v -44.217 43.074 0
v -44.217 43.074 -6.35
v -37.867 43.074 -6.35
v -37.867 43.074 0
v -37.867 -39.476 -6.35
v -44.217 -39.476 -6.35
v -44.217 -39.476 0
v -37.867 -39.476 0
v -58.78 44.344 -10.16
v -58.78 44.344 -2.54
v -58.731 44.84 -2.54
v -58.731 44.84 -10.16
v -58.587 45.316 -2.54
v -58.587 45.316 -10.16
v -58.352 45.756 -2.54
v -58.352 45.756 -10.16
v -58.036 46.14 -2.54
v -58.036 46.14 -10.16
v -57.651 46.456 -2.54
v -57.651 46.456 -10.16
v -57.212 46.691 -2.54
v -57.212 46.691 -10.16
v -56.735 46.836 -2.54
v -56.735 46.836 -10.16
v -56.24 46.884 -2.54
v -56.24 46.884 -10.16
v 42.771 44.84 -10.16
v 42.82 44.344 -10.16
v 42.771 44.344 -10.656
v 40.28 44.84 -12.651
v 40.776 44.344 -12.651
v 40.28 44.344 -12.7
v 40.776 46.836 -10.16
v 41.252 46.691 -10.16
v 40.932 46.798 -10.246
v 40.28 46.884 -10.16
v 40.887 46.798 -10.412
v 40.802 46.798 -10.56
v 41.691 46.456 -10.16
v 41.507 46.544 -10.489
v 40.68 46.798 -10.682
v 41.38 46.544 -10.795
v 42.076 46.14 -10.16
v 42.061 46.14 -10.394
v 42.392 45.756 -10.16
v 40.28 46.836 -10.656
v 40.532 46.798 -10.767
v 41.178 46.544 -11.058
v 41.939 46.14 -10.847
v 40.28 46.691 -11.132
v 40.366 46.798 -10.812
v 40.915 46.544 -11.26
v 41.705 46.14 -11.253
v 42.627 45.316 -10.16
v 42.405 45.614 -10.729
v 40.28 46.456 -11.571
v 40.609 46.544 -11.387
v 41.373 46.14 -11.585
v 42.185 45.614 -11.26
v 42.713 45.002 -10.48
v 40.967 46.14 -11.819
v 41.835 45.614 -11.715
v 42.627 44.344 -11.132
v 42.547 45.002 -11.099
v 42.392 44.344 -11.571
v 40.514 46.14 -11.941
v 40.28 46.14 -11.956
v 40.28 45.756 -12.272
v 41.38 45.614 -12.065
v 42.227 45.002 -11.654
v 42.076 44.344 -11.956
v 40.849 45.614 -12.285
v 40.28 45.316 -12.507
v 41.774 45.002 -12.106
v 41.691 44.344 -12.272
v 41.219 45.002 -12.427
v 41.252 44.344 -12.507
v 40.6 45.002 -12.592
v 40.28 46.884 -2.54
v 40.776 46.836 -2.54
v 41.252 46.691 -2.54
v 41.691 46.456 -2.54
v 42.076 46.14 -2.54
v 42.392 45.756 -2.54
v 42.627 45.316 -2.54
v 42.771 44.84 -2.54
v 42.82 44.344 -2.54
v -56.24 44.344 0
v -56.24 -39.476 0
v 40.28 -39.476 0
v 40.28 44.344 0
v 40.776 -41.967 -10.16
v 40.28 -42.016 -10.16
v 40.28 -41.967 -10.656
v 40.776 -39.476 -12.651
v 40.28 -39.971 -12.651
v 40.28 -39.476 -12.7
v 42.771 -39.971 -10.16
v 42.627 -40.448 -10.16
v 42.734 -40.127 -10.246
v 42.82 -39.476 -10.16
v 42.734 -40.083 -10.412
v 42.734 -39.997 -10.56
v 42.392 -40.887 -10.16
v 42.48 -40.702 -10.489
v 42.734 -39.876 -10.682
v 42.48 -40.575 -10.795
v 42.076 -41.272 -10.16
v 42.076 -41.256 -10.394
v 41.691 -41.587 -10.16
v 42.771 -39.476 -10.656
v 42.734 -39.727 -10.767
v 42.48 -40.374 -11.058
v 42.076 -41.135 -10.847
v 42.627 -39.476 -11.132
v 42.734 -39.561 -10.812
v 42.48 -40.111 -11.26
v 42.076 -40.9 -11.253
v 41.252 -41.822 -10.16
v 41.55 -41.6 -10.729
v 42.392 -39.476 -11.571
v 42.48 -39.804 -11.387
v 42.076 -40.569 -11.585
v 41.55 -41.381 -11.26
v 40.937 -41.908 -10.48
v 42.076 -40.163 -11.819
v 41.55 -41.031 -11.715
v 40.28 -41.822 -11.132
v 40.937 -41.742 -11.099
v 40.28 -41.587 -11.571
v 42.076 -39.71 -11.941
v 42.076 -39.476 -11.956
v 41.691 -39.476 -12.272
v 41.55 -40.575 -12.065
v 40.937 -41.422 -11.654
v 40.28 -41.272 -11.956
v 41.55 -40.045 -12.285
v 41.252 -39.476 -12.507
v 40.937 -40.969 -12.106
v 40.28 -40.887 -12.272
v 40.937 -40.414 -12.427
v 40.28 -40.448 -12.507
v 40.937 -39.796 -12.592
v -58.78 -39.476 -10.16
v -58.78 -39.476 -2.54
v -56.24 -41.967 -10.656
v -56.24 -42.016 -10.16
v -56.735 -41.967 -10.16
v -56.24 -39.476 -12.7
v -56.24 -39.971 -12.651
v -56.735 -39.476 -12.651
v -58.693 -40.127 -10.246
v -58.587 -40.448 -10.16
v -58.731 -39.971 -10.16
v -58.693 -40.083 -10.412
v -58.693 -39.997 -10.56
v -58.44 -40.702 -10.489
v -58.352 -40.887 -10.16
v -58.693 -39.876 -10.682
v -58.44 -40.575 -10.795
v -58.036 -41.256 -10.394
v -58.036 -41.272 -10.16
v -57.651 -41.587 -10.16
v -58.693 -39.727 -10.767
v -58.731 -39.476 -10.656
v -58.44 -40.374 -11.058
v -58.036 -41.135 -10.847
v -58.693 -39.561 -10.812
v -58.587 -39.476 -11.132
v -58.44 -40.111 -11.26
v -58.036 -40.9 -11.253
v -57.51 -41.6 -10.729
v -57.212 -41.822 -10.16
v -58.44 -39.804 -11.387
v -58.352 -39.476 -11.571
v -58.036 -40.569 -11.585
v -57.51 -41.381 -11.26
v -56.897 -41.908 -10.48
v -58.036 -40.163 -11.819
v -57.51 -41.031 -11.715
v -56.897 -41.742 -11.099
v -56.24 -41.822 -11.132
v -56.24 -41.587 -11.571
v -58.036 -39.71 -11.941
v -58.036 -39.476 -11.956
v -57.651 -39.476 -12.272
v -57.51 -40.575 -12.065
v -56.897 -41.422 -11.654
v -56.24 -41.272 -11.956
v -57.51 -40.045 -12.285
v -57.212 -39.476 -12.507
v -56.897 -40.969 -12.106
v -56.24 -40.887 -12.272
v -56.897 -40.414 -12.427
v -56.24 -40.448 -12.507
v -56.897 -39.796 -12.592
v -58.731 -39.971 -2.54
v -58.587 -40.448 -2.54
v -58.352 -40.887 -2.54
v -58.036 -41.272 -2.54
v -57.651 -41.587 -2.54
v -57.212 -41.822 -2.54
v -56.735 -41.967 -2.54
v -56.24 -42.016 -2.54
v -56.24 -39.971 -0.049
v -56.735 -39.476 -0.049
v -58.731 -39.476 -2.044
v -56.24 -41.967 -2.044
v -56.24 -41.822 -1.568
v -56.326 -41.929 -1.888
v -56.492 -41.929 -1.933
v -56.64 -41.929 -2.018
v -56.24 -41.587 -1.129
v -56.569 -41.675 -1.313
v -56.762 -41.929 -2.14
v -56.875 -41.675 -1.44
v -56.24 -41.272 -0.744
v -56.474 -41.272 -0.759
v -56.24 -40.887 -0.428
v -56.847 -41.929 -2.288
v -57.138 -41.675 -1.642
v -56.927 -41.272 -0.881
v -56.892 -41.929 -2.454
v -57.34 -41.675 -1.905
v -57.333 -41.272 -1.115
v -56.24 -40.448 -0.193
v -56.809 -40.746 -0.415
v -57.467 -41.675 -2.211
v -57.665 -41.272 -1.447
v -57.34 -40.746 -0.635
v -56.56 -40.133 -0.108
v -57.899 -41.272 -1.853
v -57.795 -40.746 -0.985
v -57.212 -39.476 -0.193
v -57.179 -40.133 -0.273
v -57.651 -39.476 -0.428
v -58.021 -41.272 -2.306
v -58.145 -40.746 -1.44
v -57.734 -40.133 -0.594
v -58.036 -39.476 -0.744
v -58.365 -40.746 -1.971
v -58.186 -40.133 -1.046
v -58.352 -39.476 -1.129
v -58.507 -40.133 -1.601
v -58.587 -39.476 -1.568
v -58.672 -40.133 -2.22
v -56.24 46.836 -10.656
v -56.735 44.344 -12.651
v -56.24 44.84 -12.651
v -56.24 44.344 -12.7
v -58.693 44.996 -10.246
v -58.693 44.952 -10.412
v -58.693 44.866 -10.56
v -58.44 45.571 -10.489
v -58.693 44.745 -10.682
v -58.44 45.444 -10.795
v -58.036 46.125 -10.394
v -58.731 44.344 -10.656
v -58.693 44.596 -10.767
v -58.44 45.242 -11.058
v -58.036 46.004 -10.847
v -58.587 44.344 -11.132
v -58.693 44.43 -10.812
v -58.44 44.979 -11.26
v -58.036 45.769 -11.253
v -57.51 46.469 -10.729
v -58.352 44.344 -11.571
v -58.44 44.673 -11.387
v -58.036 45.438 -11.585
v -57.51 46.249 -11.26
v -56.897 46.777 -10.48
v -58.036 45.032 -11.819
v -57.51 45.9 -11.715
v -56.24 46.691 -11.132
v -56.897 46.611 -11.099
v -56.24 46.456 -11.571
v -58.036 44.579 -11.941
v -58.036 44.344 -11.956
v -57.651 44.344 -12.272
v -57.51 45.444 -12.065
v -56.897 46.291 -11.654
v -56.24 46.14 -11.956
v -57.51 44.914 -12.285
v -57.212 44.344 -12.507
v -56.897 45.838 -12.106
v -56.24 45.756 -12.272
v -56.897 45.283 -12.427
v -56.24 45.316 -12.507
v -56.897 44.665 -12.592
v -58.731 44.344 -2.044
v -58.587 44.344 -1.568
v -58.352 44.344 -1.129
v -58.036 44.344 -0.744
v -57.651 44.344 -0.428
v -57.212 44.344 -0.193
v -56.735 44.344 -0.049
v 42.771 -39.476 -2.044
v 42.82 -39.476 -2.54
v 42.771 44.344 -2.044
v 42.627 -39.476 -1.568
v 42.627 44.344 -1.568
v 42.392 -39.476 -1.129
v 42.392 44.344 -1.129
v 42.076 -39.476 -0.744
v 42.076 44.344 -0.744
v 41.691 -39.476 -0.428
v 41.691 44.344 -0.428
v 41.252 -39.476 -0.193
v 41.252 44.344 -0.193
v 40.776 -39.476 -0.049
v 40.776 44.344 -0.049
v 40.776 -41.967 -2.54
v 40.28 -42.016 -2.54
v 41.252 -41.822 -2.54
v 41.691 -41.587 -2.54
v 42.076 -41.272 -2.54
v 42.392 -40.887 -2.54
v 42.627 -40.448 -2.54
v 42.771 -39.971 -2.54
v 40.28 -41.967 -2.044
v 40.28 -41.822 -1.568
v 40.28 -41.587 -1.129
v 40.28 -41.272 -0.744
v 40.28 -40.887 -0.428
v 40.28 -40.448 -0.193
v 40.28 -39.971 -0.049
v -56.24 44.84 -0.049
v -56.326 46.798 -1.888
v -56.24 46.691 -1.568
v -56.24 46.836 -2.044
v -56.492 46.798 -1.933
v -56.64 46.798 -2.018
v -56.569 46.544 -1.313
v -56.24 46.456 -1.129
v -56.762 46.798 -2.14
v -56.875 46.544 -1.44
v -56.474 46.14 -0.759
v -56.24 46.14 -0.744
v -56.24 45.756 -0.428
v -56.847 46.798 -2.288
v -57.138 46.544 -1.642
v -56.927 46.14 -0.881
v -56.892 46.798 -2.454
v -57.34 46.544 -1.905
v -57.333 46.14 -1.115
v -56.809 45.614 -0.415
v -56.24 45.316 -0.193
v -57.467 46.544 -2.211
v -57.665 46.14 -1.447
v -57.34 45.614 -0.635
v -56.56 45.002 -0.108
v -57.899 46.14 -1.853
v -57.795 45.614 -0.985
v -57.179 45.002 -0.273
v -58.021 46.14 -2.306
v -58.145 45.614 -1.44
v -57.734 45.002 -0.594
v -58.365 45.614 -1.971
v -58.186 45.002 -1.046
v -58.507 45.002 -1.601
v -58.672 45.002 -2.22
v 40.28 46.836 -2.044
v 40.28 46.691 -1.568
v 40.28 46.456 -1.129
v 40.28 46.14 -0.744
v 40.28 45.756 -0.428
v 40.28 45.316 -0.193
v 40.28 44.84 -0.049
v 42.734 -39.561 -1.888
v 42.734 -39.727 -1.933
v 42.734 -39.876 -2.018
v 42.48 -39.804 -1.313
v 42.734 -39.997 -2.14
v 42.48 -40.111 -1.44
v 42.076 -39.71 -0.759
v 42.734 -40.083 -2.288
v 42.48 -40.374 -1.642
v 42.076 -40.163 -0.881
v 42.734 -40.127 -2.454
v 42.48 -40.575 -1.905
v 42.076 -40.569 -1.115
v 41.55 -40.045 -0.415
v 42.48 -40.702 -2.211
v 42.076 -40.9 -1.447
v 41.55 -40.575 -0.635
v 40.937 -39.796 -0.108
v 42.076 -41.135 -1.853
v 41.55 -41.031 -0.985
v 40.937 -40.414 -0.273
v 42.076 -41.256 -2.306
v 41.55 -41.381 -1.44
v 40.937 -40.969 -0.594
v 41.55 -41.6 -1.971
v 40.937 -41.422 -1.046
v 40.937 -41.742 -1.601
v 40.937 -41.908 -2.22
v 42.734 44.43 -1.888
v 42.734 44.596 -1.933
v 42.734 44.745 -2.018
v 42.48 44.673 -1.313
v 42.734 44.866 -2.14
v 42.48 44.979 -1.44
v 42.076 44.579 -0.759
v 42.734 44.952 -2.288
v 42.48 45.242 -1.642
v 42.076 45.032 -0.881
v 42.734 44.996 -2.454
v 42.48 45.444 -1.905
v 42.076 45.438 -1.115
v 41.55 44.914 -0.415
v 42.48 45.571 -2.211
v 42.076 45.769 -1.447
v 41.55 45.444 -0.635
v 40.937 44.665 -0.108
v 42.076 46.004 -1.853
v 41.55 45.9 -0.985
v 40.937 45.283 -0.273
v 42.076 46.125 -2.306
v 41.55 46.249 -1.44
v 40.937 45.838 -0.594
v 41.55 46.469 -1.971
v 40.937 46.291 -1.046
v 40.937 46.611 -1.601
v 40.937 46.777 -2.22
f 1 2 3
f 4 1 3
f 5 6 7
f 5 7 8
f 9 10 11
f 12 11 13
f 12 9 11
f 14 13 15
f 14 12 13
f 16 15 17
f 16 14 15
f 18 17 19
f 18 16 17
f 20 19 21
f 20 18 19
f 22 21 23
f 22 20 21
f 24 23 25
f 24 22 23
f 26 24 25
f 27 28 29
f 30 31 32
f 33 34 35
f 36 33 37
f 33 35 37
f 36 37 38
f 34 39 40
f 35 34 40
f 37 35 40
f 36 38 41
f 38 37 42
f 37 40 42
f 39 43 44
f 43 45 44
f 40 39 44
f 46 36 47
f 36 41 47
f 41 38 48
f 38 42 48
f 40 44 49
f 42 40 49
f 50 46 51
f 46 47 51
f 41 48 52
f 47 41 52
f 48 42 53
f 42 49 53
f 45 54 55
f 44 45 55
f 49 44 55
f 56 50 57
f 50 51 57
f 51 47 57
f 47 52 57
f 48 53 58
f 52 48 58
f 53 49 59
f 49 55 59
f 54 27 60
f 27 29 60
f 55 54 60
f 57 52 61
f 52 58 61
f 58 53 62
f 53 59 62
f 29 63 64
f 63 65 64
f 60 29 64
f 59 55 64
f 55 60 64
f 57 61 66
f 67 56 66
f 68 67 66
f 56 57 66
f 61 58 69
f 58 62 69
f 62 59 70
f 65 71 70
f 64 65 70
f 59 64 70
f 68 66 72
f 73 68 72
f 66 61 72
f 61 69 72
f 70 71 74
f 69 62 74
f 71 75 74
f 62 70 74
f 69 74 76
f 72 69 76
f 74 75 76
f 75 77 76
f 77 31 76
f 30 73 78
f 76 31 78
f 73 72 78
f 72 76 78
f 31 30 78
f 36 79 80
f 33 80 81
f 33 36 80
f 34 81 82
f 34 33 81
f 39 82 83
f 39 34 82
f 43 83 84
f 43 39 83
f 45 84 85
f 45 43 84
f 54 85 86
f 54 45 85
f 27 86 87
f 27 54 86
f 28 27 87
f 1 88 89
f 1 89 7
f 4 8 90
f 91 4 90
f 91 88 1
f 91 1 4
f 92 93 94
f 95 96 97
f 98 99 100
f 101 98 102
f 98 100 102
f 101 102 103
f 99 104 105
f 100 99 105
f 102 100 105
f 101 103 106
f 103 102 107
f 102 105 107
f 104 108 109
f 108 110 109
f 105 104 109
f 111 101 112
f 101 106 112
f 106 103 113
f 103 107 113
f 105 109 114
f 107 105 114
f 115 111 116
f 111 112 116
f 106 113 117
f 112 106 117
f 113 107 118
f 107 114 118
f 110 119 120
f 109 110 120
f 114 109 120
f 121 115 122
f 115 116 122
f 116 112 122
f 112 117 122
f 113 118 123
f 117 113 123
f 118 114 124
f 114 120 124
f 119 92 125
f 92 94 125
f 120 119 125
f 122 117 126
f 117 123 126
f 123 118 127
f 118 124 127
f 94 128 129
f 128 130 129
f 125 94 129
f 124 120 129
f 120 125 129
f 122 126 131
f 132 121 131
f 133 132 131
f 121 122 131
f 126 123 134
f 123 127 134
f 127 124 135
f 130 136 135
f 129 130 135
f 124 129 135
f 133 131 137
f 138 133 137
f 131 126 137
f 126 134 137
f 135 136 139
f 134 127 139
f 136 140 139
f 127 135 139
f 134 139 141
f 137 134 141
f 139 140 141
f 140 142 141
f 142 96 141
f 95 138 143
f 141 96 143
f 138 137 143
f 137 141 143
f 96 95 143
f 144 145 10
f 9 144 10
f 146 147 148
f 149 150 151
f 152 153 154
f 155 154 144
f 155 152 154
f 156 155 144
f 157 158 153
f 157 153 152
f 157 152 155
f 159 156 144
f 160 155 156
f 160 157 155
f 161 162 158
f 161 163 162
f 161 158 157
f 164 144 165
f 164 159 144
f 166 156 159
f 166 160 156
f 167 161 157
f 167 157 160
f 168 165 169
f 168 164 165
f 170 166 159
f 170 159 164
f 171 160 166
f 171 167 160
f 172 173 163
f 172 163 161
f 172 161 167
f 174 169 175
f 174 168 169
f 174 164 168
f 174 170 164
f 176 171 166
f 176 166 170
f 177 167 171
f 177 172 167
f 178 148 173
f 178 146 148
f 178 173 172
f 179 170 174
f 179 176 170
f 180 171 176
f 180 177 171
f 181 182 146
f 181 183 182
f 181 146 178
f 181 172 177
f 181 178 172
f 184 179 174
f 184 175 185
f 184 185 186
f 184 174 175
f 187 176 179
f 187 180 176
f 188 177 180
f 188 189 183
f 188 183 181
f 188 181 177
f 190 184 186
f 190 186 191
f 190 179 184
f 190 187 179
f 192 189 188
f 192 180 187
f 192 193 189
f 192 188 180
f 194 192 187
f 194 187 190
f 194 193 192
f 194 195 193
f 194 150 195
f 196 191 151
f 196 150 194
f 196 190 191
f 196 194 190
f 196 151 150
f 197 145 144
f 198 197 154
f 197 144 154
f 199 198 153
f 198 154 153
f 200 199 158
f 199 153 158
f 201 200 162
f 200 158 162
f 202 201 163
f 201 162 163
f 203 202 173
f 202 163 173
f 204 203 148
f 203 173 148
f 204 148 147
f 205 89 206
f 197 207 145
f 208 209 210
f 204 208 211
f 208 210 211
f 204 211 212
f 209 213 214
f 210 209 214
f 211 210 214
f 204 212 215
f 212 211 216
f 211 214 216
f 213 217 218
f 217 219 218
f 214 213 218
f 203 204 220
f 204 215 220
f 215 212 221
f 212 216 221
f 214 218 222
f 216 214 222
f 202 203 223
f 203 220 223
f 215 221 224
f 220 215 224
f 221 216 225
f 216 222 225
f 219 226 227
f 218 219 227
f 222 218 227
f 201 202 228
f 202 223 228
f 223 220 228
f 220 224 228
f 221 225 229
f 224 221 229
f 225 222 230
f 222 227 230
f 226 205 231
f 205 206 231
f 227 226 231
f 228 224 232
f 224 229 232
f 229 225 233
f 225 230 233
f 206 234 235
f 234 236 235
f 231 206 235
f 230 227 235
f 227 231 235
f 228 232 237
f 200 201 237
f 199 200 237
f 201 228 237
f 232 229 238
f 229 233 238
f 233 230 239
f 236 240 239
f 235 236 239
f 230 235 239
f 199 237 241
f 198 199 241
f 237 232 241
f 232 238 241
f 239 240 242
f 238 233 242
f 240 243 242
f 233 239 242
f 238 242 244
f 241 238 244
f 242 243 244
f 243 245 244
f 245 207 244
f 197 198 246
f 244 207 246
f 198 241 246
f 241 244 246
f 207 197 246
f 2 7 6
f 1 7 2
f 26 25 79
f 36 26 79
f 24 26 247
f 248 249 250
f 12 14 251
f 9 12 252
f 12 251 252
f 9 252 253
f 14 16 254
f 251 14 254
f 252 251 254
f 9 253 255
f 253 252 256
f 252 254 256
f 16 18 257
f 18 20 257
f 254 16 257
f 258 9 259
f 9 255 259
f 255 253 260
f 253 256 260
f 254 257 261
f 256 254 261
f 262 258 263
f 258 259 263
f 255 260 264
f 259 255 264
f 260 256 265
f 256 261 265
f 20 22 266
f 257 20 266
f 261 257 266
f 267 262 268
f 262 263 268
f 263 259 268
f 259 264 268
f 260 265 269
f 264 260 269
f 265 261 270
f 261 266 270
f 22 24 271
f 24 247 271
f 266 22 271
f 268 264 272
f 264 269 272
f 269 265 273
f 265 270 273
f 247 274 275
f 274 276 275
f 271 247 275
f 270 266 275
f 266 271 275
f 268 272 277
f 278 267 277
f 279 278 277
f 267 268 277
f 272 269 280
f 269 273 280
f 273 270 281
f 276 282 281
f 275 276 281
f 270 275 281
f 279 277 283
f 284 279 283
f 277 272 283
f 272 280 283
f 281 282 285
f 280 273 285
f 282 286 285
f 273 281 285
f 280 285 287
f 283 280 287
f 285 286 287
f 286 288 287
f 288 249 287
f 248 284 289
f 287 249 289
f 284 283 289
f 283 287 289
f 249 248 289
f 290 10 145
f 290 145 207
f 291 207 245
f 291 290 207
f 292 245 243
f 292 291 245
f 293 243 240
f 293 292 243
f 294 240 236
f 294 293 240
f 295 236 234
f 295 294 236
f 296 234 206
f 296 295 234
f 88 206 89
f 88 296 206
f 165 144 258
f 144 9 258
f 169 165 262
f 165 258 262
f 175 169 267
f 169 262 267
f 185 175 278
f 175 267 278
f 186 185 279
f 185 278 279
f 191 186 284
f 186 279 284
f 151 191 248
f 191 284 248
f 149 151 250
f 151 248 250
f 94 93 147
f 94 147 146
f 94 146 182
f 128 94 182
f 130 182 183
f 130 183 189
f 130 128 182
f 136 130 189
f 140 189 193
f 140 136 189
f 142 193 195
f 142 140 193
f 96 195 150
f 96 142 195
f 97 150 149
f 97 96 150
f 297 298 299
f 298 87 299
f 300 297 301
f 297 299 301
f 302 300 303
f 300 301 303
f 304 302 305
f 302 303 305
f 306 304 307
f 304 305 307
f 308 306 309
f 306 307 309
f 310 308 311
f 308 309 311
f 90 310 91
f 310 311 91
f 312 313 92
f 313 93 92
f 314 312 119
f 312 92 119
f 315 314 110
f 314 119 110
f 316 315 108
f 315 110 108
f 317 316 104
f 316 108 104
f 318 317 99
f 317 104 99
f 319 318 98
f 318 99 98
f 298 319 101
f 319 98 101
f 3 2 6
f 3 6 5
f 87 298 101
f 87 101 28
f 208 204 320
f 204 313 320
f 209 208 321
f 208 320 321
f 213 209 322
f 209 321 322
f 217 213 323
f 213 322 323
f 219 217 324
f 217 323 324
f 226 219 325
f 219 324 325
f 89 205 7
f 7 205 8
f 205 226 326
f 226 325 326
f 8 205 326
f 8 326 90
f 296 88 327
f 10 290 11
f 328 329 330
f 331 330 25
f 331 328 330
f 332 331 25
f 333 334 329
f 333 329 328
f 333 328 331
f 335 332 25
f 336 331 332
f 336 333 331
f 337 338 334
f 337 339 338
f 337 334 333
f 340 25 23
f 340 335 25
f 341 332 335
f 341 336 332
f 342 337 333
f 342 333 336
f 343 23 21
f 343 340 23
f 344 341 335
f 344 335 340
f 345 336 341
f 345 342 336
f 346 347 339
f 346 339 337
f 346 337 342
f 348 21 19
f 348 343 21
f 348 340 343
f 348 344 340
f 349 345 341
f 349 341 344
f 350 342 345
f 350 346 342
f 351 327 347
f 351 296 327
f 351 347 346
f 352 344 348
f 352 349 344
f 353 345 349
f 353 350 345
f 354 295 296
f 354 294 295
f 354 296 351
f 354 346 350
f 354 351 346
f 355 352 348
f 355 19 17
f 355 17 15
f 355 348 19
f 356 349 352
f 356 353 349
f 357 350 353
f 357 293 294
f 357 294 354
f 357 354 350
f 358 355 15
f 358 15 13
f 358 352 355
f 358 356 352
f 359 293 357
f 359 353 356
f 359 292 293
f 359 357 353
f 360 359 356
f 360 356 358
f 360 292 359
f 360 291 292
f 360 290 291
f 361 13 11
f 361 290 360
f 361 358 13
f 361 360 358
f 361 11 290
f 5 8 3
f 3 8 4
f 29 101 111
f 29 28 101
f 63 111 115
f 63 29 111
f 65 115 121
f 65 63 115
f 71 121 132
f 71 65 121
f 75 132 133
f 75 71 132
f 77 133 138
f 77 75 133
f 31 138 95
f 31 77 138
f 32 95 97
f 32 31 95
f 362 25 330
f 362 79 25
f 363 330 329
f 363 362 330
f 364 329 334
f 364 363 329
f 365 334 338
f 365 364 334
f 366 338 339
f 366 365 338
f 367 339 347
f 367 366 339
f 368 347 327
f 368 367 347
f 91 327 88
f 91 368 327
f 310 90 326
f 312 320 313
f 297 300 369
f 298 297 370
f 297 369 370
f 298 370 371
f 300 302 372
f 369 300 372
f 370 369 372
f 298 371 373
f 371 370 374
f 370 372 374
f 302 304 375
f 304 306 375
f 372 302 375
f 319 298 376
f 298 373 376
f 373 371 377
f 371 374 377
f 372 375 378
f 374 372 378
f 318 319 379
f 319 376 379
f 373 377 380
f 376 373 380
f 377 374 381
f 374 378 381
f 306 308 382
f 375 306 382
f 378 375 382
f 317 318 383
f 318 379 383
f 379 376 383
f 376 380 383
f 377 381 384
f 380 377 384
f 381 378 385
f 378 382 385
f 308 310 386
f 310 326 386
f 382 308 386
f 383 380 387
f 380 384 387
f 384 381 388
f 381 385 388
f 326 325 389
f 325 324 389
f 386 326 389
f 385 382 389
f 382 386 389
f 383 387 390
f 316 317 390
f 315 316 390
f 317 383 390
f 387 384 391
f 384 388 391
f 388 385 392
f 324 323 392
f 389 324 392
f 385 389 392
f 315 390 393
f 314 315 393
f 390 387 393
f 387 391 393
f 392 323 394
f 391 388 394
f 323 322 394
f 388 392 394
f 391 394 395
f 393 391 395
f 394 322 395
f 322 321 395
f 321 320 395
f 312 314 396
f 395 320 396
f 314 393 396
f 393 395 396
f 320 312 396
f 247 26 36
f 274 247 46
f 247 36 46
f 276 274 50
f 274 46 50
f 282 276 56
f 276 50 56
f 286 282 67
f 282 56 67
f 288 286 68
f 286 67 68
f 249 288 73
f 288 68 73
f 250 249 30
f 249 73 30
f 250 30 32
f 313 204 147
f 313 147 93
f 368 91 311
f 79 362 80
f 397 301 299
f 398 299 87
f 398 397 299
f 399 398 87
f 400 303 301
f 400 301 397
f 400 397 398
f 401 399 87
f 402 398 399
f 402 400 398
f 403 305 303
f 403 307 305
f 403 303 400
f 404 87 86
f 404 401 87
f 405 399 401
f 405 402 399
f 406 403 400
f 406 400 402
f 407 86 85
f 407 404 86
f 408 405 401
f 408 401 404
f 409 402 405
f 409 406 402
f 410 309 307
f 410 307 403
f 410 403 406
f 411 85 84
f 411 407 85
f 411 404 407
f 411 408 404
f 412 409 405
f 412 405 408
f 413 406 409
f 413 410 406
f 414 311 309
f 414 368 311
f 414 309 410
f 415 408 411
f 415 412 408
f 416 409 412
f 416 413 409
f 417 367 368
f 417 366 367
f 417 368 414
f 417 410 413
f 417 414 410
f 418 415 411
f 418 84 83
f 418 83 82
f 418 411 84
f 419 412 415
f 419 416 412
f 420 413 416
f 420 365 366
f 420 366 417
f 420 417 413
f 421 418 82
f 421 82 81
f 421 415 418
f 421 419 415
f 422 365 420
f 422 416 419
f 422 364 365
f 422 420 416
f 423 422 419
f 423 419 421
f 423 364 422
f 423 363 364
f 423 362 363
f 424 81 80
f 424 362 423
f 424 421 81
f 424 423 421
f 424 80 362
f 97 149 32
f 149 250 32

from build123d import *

# Parameters (mm, degrees)
F0_W     = 101.6
F0_H     = 88.9
F0_R     = 6.35
F1_DEPTH = 12.7
F2_R     = 2.54
F3_DEPTH = 12.7
F4_W     = 6.35
F4_H     = 82.55
F5_DEPTH = 6.35


with BuildPart() as f1:
    # F0 (on Top) → F1 (new body)
    with BuildSketch(Plane.XY):
        with Locations((-7.979951, 2.434447)):
            Rectangle(F0_W, F0_H)
        Circle(F0_R, mode=Mode.SUBTRACT)
    extrude(amount=-F1_DEPTH)

    # F2
    f2_edges = [f1.edges().sort_by_distance(p)[0] for p in [
        (-58.779951, 2.434447, 0),
        (-7.979951, -42.015553, 0),
        (-7.979951, 46.884447, 0),
        (42.820049, 2.434447, 0),
        (-7.979951, -42.015553, -12.7),
        (-58.779951, -42.015553, -6.35),
        (42.820049, -42.015553, -6.35),
        (42.820049, 2.434447, -12.7),
        (42.820049, 46.884447, -6.35),
        (-7.979951, 46.884447, -12.7),
        (-58.779951, 46.884447, -6.35),
        (-58.779951, 2.434447, -12.7),
    ]]
    fillet(f2_edges, radius=F2_R)

    # F0 (on Top) → F3 (join)
    with BuildSketch(Plane.XY):
        Circle(F0_R)
    extrude(amount=-F3_DEPTH)

    # F4 (on face) → F5 (cut)
    with BuildSketch(Plane.XY):
        with Locations((-41.041727, 1.799447)):
            Rectangle(F4_W, F4_H)
    extrude(amount=-F5_DEPTH, mode=Mode.SUBTRACT)


solid = f1.part
